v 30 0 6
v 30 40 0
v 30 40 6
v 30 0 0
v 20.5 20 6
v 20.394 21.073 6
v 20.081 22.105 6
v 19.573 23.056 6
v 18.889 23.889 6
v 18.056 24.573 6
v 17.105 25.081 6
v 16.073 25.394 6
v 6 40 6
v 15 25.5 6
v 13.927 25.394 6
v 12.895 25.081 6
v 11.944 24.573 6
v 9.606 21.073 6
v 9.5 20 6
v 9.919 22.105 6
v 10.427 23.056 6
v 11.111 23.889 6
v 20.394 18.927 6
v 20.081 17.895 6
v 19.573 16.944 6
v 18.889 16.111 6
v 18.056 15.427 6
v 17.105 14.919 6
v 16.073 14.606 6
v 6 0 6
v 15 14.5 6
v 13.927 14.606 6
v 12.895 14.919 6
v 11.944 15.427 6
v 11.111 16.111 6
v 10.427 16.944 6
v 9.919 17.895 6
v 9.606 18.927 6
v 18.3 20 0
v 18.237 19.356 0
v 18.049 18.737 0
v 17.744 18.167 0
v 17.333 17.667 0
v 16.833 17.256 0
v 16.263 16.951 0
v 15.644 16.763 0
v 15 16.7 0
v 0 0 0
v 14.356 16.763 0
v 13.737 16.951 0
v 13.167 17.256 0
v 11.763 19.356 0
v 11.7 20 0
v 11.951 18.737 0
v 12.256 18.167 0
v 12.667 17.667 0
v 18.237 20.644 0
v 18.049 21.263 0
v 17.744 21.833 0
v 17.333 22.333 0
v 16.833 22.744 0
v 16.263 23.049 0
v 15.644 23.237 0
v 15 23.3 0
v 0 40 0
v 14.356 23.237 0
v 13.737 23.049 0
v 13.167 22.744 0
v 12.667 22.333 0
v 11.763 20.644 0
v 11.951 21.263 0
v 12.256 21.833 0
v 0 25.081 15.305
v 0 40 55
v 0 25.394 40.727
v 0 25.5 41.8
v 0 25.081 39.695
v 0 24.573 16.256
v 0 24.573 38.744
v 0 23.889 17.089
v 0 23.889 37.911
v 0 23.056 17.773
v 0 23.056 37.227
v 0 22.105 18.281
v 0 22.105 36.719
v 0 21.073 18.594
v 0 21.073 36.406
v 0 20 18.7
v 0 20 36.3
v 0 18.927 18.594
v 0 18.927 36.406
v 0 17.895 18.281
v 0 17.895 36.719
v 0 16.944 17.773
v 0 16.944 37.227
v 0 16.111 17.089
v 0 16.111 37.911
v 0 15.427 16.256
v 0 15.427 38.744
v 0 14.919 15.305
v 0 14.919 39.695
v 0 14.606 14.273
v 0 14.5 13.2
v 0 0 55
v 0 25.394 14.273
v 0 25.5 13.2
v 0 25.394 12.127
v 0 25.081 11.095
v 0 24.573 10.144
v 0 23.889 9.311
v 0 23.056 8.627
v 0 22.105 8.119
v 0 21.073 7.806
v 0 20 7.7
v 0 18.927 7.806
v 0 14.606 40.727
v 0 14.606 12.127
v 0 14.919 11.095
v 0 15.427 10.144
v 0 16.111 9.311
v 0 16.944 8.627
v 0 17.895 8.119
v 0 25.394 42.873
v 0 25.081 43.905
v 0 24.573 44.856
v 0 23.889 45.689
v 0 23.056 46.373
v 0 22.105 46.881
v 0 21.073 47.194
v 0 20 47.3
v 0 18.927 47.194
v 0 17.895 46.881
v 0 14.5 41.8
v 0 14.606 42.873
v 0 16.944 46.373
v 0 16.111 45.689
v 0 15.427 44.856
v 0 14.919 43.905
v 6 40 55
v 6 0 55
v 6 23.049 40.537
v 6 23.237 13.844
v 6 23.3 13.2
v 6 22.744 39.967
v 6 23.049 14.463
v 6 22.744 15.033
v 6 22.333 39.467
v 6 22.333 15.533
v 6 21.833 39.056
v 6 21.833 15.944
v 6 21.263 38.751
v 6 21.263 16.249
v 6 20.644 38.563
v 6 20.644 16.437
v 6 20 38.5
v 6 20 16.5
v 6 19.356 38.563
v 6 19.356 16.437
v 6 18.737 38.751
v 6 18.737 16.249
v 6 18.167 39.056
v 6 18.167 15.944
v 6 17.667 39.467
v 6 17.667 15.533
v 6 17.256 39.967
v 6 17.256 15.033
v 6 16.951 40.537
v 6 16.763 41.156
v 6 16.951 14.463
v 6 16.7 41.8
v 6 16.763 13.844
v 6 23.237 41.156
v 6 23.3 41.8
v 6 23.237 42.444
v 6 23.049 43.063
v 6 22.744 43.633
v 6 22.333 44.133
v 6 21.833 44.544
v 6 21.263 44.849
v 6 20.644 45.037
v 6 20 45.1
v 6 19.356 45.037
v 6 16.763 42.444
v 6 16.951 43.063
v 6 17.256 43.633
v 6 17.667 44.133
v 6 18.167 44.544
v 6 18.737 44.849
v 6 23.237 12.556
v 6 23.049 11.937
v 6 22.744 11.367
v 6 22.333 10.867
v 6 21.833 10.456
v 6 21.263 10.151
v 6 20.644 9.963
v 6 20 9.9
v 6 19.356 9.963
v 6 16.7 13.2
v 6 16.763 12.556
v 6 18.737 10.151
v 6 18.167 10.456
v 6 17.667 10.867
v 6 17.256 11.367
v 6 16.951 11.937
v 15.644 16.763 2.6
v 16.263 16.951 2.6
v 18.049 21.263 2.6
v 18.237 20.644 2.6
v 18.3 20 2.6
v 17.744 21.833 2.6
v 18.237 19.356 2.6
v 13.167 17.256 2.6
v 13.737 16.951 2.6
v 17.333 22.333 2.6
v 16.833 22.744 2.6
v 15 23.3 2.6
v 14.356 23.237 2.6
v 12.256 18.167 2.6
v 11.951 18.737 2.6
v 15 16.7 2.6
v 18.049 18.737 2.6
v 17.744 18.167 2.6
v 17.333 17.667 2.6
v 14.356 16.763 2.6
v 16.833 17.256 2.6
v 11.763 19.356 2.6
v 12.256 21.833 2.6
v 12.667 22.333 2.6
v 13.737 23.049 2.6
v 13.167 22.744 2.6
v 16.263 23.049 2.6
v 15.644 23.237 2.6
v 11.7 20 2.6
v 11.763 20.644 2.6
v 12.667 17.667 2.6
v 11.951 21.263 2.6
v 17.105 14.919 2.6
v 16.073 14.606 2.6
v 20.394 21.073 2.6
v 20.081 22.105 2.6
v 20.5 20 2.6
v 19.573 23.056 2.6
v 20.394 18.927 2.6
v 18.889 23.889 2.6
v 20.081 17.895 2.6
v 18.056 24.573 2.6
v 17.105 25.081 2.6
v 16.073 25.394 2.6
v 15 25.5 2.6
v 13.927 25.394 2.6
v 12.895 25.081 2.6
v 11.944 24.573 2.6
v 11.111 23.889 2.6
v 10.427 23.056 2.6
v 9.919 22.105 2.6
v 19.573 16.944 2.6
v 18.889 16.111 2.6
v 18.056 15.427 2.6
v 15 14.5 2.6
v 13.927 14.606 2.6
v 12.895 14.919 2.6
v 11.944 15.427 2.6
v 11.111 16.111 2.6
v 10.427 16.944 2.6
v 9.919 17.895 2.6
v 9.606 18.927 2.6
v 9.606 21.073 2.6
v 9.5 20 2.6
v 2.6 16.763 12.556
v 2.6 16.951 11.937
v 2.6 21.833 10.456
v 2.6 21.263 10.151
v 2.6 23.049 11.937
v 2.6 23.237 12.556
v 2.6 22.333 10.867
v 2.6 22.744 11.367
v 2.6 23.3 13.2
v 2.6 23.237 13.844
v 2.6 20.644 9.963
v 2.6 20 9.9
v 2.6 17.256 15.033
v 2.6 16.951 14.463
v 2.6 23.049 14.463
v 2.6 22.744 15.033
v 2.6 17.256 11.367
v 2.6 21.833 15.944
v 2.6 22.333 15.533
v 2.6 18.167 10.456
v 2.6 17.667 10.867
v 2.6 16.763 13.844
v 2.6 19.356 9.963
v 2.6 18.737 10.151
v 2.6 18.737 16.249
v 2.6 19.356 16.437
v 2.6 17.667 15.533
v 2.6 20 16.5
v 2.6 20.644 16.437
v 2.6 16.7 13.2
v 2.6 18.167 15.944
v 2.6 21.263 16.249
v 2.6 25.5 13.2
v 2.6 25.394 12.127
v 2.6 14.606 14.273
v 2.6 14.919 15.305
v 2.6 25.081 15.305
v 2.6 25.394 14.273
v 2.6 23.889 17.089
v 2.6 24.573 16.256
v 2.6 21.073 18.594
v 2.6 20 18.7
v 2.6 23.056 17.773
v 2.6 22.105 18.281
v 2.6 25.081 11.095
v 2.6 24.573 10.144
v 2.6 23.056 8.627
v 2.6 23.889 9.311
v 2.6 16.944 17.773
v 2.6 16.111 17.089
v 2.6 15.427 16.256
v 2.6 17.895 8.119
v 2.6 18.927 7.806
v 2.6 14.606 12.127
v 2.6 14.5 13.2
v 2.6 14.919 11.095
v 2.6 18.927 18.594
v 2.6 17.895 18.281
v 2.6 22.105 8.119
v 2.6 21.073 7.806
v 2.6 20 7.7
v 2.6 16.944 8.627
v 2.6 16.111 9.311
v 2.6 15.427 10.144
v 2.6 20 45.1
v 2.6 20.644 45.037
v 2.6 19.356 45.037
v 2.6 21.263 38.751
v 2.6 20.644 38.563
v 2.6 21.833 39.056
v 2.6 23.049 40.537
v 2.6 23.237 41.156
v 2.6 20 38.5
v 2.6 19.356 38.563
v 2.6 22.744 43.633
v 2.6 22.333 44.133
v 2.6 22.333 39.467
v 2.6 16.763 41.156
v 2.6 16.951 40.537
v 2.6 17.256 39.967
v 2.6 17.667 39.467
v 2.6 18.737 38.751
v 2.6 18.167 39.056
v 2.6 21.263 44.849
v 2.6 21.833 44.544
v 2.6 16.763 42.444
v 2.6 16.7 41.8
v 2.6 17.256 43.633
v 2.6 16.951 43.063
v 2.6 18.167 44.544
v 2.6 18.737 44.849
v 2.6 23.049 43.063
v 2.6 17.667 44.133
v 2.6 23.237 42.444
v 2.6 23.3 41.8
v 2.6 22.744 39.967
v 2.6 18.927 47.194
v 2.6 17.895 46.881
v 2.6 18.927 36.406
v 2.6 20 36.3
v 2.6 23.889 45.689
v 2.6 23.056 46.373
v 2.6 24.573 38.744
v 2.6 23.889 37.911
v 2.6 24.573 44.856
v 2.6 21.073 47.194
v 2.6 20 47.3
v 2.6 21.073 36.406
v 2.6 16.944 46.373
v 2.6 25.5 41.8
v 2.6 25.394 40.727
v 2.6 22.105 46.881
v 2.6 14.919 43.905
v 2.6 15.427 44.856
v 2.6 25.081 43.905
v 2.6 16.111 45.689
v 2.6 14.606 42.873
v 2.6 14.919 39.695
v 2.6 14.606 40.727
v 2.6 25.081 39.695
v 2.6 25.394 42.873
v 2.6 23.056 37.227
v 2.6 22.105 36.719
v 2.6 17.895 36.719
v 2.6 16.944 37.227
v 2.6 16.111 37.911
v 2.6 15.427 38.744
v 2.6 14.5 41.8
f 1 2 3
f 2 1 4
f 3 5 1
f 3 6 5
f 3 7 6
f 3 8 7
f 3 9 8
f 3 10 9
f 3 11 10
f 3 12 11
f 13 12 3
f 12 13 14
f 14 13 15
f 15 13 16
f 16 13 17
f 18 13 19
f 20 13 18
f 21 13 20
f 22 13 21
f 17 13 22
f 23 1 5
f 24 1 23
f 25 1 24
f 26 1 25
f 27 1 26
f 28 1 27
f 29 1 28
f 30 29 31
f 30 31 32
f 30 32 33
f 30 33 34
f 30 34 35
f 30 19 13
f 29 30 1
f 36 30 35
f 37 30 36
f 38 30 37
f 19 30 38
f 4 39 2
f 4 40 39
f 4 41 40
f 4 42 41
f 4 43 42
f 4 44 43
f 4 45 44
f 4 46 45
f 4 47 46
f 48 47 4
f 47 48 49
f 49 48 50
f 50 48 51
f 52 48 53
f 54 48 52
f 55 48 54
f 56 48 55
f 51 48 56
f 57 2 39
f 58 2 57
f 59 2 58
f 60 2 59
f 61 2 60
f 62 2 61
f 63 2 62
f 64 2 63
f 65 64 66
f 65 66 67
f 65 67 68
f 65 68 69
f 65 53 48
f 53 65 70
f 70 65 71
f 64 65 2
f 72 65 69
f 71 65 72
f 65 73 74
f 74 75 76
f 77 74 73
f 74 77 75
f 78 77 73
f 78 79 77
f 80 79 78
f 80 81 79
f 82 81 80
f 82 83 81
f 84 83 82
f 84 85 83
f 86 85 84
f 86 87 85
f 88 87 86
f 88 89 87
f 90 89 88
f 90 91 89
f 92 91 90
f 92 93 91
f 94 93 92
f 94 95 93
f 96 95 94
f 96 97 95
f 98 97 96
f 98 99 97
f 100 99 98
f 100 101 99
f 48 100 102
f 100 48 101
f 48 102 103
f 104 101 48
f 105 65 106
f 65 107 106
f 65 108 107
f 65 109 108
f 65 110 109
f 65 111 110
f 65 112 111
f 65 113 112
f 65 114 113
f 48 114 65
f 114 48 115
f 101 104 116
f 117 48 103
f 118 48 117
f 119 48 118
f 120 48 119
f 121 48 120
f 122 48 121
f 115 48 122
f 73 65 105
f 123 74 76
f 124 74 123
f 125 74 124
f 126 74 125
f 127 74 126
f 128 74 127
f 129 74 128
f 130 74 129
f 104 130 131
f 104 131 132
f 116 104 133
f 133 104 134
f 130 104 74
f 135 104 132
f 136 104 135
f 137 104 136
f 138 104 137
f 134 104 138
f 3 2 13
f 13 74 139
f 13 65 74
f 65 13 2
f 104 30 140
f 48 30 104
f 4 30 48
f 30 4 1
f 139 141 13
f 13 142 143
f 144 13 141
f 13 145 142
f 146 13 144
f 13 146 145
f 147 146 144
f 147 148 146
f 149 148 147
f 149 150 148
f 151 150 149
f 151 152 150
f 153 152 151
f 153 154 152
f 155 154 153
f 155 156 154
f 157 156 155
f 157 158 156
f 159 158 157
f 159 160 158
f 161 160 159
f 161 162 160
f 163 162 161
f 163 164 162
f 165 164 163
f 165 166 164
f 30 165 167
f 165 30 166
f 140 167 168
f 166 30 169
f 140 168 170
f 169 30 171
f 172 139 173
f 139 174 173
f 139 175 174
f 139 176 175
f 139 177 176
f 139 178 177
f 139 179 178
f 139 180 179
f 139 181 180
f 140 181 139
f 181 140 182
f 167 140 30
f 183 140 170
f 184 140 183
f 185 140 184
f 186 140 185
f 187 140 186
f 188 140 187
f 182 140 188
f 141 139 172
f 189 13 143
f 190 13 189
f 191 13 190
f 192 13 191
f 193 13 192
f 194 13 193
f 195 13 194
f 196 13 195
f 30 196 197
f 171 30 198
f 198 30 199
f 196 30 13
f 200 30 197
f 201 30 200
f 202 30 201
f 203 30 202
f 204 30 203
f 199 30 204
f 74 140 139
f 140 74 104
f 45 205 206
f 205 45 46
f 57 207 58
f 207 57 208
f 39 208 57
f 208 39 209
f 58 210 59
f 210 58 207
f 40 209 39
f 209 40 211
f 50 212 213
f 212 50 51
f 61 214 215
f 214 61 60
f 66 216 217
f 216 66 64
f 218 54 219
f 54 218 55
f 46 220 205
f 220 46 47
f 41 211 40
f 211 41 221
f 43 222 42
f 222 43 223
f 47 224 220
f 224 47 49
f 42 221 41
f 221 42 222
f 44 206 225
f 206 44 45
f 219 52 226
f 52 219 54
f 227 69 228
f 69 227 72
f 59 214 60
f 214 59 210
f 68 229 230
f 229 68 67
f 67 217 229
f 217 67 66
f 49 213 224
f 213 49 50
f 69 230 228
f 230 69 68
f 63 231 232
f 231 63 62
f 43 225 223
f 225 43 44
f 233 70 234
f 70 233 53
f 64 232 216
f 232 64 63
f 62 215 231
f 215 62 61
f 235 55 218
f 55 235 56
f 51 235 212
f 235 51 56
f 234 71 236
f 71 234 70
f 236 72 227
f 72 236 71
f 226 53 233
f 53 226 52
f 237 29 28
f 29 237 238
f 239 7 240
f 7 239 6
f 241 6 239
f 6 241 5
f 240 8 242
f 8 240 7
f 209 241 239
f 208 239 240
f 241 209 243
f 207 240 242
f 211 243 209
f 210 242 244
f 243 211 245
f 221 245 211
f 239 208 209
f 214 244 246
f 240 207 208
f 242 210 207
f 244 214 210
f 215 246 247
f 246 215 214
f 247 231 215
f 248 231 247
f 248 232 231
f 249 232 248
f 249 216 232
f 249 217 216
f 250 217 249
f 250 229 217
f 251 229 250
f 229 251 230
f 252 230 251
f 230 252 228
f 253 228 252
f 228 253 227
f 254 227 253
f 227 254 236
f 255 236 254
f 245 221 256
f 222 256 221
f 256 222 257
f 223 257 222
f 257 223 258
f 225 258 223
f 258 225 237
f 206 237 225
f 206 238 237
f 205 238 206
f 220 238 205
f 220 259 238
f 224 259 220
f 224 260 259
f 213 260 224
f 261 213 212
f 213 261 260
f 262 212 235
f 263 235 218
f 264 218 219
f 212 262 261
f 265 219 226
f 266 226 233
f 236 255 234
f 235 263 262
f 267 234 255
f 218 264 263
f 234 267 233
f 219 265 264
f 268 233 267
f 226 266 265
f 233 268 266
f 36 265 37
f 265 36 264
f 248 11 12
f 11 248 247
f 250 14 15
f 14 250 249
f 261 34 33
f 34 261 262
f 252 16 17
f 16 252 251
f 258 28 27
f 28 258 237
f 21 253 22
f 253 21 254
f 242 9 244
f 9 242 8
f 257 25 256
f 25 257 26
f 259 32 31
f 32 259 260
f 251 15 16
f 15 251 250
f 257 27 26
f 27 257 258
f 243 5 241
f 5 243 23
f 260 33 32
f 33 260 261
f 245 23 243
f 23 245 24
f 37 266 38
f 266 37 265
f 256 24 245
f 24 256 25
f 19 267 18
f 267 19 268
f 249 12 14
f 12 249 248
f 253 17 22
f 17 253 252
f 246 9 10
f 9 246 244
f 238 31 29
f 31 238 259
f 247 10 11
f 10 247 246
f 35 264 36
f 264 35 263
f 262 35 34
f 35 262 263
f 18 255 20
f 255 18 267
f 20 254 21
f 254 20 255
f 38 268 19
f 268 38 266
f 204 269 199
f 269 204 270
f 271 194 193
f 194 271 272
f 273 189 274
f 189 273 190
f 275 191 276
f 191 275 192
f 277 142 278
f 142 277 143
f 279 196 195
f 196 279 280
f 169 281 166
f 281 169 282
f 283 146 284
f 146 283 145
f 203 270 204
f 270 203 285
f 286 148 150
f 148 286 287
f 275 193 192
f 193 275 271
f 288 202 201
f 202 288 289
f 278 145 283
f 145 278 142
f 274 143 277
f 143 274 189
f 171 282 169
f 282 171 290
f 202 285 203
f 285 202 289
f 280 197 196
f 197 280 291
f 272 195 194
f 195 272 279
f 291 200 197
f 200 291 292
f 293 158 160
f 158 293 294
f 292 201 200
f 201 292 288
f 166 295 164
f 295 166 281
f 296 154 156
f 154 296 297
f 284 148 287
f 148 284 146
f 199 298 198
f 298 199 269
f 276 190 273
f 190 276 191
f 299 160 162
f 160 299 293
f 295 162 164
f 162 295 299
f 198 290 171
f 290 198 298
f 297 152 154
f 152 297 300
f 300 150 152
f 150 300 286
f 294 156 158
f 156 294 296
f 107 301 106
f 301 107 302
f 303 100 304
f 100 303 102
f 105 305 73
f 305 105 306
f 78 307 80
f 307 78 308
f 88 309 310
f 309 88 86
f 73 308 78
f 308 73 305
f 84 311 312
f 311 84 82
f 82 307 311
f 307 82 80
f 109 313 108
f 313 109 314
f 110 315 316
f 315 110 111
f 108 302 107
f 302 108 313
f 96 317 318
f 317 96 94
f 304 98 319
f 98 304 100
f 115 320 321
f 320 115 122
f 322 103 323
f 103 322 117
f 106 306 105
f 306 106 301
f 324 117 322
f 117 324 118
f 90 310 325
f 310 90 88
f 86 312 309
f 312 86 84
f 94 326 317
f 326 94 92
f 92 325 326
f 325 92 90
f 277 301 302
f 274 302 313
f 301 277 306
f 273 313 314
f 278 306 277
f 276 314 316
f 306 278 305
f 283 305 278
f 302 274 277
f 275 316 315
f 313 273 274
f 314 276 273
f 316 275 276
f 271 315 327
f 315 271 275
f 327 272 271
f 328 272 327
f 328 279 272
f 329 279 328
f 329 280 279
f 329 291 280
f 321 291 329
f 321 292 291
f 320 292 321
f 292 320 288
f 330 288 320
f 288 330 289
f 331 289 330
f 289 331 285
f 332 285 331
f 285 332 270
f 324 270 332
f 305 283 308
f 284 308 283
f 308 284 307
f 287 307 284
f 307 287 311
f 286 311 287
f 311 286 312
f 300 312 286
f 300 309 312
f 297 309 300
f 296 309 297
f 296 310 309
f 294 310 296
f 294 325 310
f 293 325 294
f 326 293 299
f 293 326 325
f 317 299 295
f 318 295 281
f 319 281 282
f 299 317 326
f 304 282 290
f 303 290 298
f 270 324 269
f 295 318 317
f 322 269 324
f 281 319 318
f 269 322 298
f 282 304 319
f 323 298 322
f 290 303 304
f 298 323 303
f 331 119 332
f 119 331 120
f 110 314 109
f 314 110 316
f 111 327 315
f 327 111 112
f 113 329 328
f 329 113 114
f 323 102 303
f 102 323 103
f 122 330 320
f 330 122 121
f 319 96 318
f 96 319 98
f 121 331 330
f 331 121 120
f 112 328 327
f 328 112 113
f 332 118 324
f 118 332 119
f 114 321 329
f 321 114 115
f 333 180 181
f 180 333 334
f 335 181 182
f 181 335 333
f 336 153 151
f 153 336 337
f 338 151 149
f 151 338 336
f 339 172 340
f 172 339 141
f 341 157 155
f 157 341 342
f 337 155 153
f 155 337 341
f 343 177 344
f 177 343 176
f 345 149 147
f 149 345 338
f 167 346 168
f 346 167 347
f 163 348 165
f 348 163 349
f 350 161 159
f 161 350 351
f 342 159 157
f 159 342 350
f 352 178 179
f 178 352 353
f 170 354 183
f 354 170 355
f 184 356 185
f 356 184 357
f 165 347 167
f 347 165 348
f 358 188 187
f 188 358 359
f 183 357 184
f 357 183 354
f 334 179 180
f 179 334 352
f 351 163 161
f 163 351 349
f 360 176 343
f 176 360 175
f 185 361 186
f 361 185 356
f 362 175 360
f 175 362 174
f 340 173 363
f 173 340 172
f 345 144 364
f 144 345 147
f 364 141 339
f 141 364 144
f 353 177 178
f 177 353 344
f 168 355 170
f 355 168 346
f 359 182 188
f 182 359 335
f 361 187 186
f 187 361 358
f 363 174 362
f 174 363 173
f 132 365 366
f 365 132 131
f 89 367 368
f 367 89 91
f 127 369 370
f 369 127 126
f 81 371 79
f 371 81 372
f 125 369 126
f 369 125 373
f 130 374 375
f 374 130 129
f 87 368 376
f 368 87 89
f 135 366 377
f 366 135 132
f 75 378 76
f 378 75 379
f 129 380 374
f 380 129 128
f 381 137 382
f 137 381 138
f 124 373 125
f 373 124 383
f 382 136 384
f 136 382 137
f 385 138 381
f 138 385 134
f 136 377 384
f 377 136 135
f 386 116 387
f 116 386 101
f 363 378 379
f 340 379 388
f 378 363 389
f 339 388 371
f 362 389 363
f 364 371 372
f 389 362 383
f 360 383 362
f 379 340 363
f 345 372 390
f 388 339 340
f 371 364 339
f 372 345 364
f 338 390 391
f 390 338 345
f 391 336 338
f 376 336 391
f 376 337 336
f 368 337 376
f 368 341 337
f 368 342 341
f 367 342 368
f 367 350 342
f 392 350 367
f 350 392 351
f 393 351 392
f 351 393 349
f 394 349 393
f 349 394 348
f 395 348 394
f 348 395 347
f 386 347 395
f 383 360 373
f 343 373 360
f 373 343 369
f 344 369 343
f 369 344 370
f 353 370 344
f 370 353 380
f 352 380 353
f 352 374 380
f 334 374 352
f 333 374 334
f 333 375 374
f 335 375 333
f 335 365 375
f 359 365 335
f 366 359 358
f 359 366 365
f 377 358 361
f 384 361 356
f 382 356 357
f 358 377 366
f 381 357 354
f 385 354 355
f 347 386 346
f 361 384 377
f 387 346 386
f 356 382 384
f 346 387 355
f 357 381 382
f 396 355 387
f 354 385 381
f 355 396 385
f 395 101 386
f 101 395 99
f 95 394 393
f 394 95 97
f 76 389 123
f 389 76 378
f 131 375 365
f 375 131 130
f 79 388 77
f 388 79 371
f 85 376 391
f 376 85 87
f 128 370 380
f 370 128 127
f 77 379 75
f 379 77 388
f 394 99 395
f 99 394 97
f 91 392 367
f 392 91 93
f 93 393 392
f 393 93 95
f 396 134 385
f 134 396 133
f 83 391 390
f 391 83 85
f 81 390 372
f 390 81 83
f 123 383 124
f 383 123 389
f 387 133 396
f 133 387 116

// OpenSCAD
$fn = 32;

// ----------------------------------------------------------------------
// L-bracket: 30 x 40 x 55 mm
// ----------------------------------------------------------------------

// --- parameters (mm) ---
run_out = 30;             // horizontal leg, X
rise = 55;                // vertical leg, Z
bracket_w = 40;           // bracket depth, Y
sheet_t = 6;              // plate thickness
hole_d = 6.6;             // clearance for M6
cb_d = 11;                // counterbore seat
cb_h = 3.4;               // counterbore depth

module hole_z(px, py) {
  translate([px, py, -0.5]) cylinder(h = sheet_t + 1, d = hole_d);
}
module hole_x(pz, py) {
  translate([-0.5, py, pz]) rotate([0, 90, 0]) cylinder(h = sheet_t + 1, d = hole_d);
}
module cb_z(px, py) {
  translate([px, py, sheet_t - cb_h]) cylinder(h = cb_h + 0.4, d = cb_d);
}
module cb_x(pz, py) {
  translate([sheet_t - cb_h, py, pz]) rotate([0, -90, 0]) cylinder(h = cb_h + 0.4, d = cb_d);
}

difference() {
  union() {
    /* horizontal leg */
    cube([run_out, bracket_w, sheet_t]);
    /* vertical leg, overlapping the corner block */
    cube([sheet_t, bracket_w, rise]);
  }
  hole_z(15, 20);
  cb_z(15, 20);
  hole_x(13.2, 20);
  cb_x(13.2, 20);
  hole_x(41.8, 20);
  cb_x(41.8, 20);
}
